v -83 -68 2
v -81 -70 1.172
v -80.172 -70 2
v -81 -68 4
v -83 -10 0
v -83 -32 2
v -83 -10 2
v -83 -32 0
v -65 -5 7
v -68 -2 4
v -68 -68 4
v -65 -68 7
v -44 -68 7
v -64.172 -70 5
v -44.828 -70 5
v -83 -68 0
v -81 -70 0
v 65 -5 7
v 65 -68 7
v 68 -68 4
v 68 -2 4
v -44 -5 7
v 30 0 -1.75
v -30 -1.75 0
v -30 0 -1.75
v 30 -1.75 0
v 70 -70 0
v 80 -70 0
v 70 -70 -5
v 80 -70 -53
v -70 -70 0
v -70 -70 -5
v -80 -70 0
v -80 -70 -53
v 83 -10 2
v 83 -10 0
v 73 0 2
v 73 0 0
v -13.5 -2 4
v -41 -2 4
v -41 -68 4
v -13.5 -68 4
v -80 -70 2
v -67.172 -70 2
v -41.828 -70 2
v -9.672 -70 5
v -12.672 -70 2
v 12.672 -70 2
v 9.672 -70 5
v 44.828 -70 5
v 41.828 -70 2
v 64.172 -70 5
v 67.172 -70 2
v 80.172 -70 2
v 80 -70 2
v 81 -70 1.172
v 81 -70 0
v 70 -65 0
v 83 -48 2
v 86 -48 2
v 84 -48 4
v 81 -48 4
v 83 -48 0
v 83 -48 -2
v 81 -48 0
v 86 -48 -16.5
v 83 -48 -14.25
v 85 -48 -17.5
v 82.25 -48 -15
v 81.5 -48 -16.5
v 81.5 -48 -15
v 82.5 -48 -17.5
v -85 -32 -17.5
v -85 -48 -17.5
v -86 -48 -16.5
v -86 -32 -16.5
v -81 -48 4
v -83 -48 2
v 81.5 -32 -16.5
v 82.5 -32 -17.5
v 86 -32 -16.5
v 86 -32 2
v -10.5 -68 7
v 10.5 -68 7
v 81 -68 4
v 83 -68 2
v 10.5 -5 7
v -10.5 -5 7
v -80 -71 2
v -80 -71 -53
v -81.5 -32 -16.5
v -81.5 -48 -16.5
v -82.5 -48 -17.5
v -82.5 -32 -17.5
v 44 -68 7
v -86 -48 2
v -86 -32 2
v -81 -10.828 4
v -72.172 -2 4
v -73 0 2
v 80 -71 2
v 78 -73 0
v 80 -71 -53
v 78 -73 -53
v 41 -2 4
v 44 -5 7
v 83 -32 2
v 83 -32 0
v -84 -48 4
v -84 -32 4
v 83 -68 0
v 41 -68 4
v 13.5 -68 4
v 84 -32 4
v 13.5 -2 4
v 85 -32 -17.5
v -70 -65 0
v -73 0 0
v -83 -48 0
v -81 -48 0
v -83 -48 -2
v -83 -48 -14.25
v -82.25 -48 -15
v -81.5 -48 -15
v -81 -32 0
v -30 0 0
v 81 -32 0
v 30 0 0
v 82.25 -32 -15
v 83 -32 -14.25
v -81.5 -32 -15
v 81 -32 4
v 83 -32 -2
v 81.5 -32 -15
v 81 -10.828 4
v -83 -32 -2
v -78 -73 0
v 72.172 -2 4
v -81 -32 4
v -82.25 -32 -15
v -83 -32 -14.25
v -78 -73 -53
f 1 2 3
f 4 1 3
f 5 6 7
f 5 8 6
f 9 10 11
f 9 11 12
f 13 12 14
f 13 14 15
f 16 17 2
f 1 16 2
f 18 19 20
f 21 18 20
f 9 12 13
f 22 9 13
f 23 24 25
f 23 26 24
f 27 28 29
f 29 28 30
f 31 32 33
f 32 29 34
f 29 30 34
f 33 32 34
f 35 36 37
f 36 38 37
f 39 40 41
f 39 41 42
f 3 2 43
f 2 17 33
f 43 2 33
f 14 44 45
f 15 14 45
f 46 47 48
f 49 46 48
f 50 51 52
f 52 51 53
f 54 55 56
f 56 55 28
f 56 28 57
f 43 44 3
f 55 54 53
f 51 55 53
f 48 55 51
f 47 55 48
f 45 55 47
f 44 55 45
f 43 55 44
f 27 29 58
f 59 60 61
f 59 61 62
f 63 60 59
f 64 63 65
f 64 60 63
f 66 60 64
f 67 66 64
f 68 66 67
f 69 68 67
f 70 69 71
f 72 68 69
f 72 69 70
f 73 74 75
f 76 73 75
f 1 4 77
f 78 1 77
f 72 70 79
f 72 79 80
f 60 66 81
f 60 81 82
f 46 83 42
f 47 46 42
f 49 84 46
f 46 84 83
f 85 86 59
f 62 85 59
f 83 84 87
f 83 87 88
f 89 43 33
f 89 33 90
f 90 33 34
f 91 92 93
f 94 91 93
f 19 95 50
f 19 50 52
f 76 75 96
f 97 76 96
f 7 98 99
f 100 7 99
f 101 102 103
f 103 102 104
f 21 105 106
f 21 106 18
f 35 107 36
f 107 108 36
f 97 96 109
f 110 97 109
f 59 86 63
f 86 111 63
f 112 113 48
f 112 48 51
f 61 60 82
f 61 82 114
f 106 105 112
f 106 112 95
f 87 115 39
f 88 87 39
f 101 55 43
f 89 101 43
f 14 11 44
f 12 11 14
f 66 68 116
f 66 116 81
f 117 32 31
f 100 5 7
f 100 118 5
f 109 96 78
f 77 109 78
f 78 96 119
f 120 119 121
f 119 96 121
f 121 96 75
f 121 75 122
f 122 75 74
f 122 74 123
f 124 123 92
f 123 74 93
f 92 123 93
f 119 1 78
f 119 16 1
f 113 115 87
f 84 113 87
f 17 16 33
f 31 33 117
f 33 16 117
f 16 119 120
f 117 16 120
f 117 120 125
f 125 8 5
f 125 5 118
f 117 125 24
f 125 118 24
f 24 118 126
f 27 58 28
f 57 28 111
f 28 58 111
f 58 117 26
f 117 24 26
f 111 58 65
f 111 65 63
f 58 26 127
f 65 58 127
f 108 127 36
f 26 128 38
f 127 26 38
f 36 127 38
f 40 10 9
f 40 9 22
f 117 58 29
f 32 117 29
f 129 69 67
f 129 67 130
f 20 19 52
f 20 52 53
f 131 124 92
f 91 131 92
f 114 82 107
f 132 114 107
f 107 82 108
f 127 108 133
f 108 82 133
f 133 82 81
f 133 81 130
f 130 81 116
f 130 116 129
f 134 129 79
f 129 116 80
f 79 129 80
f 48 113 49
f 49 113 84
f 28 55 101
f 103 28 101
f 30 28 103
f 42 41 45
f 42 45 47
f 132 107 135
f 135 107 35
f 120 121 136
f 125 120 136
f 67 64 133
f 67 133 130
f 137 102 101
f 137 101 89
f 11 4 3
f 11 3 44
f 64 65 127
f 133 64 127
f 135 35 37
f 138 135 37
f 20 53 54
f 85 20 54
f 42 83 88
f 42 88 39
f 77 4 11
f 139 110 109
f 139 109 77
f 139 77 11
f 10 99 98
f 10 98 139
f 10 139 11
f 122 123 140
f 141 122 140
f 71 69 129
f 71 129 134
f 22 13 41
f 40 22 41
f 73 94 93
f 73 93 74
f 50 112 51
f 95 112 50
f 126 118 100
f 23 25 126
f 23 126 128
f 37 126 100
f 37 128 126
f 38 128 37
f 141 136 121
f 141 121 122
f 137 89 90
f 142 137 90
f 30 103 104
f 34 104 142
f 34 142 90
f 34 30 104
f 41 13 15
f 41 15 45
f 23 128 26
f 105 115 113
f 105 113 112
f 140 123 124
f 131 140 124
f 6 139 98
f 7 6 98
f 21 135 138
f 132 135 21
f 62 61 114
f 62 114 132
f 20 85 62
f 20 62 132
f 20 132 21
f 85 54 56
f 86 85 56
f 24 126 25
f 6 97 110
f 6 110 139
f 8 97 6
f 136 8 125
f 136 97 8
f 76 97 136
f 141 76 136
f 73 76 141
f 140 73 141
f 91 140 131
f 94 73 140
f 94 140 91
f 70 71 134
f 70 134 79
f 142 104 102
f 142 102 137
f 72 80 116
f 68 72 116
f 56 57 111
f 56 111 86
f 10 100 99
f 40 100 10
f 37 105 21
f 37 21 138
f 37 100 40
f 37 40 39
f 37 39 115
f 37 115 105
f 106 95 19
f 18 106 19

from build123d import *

# Parameters (mm, degrees)
SKETCH1_W           = 166
SKETCH1_H           = 70
BOSS_EXTRUDE1_DEPTH = 4
CHAMFER1_SIZE       = 10
CHAMFER2_SIZE       = 2
BOSS_EXTRUDE2_DEPTH = 68
CHAMFER3_SIZE       = 3
SKETCH3_W           = 160
SKETCH3_H           = 55
BOSS_EXTRUDE3_DEPTH = 3
CHAMFER4_SIZE       = 2
BOSS_EXTRUDE4_DEPTH = 140
BOSS_EXTRUDE5_DEPTH = 16
CHAMFER5_SIZE       = 0.75
CHAMFER6_SIZE       = 2
CHAMFER7_SIZE       = 2
BOSS_EXTRUDE6_DEPTH = 30


with BuildPart() as part:
    # Sketch1 → Boss-Extrude1 (new body)
    with BuildSketch(Plane.XY):
        with Locations((0, -35)):
            Rectangle(SKETCH1_W, SKETCH1_H)
    extrude(amount=BOSS_EXTRUDE1_DEPTH)

    # Chamfer1
    chamfer1_edges = [part.edges().sort_by_distance(p)[0] for p in [
        (-83, 0, 2),
        (83, 0, 2),
    ]]
    chamfer(chamfer1_edges, length=CHAMFER1_SIZE)

    # Chamfer2
    chamfer2_edges = [part.edges().sort_by_distance(p)[0] for p in [
        (-83, -40, 4),
        (0, 0, 4),
        (78, -5, 4),
        (-78, -5, 4),
        (83, -40, 4),
    ]]
    chamfer(chamfer2_edges, length=CHAMFER2_SIZE)

    # Sketch2 → Boss-Extrude2 (add)
    with BuildSketch(Plane(origin=(0, -70, 0), x_dir=(-1, 0, 0), z_dir=(0, -1, 0))):
        Polygon((68, -4), (65, -7), (44, -7), (41, -4), align=None)
        Polygon((13.5, -4), (-13.5, -4), (-10.5, -7), (10.5, -7), align=None)
        Polygon((-41, -4), (-44, -7), (-65, -7), (-68, -4), align=None)
    extrude(amount=-BOSS_EXTRUDE2_DEPTH)

    # Chamfer3
    chamfer3_edges = [part.edges().sort_by_distance(p)[0] for p in [
        (54.5, -2, 7),
        (0, -2, 7),
        (-54.5, -2, 7),
    ]]
    chamfer(chamfer3_edges, length=CHAMFER3_SIZE - 0.0001)  # a hair under: the kernel refuses the full size

    # Sketch3 → Boss-Extrude3 (add)
    with BuildSketch(Plane(origin=(0, -70, 0), x_dir=(-1, 0, 0), z_dir=(0, -1, 0))):
        with Locations((0, 25.5)):
            Rectangle(SKETCH3_W, SKETCH3_H)
    extrude(amount=BOSS_EXTRUDE3_DEPTH)

    # Chamfer4
    chamfer4_edges = [part.edges().sort_by_distance(p)[0] for p in [
        (80, -73, -25.5),
        (0, -73, 2),
        (-80, -73, -25.5),
    ]]
    chamfer(chamfer4_edges, length=CHAMFER4_SIZE)

    # Sketch4 → Boss-Extrude4 (add)
    with BuildSketch(Plane.ZY.offset(70)):
        Polygon((0, -70), (0, -65), (-5, -70), align=None)
    extrude(amount=-BOSS_EXTRUDE4_DEPTH)

    # Sketch5 → Boss-Extrude5 (add)
    with BuildSketch(Plane(origin=(0, -48, 0), x_dir=(-1, 0, 0), z_dir=(0, -1, 0))):
        Polygon((-81, -4), (-83, -2), (-83, 15), (-81.5, 15), (-81.5, 16.5), (-82.5, 17.5), (-85, 17.5), (-86, 16.5), (-86, -2), (-84, -4), align=None)
        Polygon((81.5, 16.5), (82.5, 17.5), (85, 17.5), (86, 16.5), (86, -2), (84, -4), (81, -4), (83, -2), (83, 15), (81.5, 15), align=None)
    extrude(amount=-BOSS_EXTRUDE5_DEPTH)

    # Chamfer5
    chamfer5_edges = [part.edges().sort_by_distance(p)[0] for p in [
        (83, -40, -15),
        (-83, -40, -15),
    ]]
    chamfer(chamfer5_edges, length=CHAMFER5_SIZE)

    # Chamfer6
    chamfer6_edges = [part.edges().sort_by_distance(p)[0] for p in [
        (83, -40, 0),
        (-83, -40, 0),
    ]]
    chamfer(chamfer6_edges, length=CHAMFER6_SIZE)

    # Chamfer7
    chamfer7_edges = [part.edges().sort_by_distance(p)[0] for p in [
        (-74.5, -70, 4),
        (83, -70, 1),
        (-83, -70, 1),
        (-82, -70, 3),
        (82, -70, 3),
        (-27.25, -70, 4),
        (-42.5, -70, 5.5),
        (-54.5, -70, 7),
        (-66.5, -70, 5.5),
        (27.25, -70, 4),
        (-12, -70, 5.5),
        (12, -70, 5.5),
        (0, -70, 7),
        (74.5, -70, 4),
        (66.5, -70, 5.5),
        (54.5, -70, 7),
        (42.5, -70, 5.5),
    ]]
    chamfer(chamfer7_edges, length=CHAMFER7_SIZE - 0.0001)  # a hair under: the kernel refuses the full size

    # Sketch6 → Boss-Extrude6 (add, symmetric)
    with BuildSketch(Plane(origin=(0, 0, 0), x_dir=(0, 0, -1), z_dir=(1, 0, 0))):
        Polygon((0, -1.75), (1.75, 0), (0, 0), align=None)
    extrude(amount=BOSS_EXTRUDE6_DEPTH, both=True)


solid = part.part
